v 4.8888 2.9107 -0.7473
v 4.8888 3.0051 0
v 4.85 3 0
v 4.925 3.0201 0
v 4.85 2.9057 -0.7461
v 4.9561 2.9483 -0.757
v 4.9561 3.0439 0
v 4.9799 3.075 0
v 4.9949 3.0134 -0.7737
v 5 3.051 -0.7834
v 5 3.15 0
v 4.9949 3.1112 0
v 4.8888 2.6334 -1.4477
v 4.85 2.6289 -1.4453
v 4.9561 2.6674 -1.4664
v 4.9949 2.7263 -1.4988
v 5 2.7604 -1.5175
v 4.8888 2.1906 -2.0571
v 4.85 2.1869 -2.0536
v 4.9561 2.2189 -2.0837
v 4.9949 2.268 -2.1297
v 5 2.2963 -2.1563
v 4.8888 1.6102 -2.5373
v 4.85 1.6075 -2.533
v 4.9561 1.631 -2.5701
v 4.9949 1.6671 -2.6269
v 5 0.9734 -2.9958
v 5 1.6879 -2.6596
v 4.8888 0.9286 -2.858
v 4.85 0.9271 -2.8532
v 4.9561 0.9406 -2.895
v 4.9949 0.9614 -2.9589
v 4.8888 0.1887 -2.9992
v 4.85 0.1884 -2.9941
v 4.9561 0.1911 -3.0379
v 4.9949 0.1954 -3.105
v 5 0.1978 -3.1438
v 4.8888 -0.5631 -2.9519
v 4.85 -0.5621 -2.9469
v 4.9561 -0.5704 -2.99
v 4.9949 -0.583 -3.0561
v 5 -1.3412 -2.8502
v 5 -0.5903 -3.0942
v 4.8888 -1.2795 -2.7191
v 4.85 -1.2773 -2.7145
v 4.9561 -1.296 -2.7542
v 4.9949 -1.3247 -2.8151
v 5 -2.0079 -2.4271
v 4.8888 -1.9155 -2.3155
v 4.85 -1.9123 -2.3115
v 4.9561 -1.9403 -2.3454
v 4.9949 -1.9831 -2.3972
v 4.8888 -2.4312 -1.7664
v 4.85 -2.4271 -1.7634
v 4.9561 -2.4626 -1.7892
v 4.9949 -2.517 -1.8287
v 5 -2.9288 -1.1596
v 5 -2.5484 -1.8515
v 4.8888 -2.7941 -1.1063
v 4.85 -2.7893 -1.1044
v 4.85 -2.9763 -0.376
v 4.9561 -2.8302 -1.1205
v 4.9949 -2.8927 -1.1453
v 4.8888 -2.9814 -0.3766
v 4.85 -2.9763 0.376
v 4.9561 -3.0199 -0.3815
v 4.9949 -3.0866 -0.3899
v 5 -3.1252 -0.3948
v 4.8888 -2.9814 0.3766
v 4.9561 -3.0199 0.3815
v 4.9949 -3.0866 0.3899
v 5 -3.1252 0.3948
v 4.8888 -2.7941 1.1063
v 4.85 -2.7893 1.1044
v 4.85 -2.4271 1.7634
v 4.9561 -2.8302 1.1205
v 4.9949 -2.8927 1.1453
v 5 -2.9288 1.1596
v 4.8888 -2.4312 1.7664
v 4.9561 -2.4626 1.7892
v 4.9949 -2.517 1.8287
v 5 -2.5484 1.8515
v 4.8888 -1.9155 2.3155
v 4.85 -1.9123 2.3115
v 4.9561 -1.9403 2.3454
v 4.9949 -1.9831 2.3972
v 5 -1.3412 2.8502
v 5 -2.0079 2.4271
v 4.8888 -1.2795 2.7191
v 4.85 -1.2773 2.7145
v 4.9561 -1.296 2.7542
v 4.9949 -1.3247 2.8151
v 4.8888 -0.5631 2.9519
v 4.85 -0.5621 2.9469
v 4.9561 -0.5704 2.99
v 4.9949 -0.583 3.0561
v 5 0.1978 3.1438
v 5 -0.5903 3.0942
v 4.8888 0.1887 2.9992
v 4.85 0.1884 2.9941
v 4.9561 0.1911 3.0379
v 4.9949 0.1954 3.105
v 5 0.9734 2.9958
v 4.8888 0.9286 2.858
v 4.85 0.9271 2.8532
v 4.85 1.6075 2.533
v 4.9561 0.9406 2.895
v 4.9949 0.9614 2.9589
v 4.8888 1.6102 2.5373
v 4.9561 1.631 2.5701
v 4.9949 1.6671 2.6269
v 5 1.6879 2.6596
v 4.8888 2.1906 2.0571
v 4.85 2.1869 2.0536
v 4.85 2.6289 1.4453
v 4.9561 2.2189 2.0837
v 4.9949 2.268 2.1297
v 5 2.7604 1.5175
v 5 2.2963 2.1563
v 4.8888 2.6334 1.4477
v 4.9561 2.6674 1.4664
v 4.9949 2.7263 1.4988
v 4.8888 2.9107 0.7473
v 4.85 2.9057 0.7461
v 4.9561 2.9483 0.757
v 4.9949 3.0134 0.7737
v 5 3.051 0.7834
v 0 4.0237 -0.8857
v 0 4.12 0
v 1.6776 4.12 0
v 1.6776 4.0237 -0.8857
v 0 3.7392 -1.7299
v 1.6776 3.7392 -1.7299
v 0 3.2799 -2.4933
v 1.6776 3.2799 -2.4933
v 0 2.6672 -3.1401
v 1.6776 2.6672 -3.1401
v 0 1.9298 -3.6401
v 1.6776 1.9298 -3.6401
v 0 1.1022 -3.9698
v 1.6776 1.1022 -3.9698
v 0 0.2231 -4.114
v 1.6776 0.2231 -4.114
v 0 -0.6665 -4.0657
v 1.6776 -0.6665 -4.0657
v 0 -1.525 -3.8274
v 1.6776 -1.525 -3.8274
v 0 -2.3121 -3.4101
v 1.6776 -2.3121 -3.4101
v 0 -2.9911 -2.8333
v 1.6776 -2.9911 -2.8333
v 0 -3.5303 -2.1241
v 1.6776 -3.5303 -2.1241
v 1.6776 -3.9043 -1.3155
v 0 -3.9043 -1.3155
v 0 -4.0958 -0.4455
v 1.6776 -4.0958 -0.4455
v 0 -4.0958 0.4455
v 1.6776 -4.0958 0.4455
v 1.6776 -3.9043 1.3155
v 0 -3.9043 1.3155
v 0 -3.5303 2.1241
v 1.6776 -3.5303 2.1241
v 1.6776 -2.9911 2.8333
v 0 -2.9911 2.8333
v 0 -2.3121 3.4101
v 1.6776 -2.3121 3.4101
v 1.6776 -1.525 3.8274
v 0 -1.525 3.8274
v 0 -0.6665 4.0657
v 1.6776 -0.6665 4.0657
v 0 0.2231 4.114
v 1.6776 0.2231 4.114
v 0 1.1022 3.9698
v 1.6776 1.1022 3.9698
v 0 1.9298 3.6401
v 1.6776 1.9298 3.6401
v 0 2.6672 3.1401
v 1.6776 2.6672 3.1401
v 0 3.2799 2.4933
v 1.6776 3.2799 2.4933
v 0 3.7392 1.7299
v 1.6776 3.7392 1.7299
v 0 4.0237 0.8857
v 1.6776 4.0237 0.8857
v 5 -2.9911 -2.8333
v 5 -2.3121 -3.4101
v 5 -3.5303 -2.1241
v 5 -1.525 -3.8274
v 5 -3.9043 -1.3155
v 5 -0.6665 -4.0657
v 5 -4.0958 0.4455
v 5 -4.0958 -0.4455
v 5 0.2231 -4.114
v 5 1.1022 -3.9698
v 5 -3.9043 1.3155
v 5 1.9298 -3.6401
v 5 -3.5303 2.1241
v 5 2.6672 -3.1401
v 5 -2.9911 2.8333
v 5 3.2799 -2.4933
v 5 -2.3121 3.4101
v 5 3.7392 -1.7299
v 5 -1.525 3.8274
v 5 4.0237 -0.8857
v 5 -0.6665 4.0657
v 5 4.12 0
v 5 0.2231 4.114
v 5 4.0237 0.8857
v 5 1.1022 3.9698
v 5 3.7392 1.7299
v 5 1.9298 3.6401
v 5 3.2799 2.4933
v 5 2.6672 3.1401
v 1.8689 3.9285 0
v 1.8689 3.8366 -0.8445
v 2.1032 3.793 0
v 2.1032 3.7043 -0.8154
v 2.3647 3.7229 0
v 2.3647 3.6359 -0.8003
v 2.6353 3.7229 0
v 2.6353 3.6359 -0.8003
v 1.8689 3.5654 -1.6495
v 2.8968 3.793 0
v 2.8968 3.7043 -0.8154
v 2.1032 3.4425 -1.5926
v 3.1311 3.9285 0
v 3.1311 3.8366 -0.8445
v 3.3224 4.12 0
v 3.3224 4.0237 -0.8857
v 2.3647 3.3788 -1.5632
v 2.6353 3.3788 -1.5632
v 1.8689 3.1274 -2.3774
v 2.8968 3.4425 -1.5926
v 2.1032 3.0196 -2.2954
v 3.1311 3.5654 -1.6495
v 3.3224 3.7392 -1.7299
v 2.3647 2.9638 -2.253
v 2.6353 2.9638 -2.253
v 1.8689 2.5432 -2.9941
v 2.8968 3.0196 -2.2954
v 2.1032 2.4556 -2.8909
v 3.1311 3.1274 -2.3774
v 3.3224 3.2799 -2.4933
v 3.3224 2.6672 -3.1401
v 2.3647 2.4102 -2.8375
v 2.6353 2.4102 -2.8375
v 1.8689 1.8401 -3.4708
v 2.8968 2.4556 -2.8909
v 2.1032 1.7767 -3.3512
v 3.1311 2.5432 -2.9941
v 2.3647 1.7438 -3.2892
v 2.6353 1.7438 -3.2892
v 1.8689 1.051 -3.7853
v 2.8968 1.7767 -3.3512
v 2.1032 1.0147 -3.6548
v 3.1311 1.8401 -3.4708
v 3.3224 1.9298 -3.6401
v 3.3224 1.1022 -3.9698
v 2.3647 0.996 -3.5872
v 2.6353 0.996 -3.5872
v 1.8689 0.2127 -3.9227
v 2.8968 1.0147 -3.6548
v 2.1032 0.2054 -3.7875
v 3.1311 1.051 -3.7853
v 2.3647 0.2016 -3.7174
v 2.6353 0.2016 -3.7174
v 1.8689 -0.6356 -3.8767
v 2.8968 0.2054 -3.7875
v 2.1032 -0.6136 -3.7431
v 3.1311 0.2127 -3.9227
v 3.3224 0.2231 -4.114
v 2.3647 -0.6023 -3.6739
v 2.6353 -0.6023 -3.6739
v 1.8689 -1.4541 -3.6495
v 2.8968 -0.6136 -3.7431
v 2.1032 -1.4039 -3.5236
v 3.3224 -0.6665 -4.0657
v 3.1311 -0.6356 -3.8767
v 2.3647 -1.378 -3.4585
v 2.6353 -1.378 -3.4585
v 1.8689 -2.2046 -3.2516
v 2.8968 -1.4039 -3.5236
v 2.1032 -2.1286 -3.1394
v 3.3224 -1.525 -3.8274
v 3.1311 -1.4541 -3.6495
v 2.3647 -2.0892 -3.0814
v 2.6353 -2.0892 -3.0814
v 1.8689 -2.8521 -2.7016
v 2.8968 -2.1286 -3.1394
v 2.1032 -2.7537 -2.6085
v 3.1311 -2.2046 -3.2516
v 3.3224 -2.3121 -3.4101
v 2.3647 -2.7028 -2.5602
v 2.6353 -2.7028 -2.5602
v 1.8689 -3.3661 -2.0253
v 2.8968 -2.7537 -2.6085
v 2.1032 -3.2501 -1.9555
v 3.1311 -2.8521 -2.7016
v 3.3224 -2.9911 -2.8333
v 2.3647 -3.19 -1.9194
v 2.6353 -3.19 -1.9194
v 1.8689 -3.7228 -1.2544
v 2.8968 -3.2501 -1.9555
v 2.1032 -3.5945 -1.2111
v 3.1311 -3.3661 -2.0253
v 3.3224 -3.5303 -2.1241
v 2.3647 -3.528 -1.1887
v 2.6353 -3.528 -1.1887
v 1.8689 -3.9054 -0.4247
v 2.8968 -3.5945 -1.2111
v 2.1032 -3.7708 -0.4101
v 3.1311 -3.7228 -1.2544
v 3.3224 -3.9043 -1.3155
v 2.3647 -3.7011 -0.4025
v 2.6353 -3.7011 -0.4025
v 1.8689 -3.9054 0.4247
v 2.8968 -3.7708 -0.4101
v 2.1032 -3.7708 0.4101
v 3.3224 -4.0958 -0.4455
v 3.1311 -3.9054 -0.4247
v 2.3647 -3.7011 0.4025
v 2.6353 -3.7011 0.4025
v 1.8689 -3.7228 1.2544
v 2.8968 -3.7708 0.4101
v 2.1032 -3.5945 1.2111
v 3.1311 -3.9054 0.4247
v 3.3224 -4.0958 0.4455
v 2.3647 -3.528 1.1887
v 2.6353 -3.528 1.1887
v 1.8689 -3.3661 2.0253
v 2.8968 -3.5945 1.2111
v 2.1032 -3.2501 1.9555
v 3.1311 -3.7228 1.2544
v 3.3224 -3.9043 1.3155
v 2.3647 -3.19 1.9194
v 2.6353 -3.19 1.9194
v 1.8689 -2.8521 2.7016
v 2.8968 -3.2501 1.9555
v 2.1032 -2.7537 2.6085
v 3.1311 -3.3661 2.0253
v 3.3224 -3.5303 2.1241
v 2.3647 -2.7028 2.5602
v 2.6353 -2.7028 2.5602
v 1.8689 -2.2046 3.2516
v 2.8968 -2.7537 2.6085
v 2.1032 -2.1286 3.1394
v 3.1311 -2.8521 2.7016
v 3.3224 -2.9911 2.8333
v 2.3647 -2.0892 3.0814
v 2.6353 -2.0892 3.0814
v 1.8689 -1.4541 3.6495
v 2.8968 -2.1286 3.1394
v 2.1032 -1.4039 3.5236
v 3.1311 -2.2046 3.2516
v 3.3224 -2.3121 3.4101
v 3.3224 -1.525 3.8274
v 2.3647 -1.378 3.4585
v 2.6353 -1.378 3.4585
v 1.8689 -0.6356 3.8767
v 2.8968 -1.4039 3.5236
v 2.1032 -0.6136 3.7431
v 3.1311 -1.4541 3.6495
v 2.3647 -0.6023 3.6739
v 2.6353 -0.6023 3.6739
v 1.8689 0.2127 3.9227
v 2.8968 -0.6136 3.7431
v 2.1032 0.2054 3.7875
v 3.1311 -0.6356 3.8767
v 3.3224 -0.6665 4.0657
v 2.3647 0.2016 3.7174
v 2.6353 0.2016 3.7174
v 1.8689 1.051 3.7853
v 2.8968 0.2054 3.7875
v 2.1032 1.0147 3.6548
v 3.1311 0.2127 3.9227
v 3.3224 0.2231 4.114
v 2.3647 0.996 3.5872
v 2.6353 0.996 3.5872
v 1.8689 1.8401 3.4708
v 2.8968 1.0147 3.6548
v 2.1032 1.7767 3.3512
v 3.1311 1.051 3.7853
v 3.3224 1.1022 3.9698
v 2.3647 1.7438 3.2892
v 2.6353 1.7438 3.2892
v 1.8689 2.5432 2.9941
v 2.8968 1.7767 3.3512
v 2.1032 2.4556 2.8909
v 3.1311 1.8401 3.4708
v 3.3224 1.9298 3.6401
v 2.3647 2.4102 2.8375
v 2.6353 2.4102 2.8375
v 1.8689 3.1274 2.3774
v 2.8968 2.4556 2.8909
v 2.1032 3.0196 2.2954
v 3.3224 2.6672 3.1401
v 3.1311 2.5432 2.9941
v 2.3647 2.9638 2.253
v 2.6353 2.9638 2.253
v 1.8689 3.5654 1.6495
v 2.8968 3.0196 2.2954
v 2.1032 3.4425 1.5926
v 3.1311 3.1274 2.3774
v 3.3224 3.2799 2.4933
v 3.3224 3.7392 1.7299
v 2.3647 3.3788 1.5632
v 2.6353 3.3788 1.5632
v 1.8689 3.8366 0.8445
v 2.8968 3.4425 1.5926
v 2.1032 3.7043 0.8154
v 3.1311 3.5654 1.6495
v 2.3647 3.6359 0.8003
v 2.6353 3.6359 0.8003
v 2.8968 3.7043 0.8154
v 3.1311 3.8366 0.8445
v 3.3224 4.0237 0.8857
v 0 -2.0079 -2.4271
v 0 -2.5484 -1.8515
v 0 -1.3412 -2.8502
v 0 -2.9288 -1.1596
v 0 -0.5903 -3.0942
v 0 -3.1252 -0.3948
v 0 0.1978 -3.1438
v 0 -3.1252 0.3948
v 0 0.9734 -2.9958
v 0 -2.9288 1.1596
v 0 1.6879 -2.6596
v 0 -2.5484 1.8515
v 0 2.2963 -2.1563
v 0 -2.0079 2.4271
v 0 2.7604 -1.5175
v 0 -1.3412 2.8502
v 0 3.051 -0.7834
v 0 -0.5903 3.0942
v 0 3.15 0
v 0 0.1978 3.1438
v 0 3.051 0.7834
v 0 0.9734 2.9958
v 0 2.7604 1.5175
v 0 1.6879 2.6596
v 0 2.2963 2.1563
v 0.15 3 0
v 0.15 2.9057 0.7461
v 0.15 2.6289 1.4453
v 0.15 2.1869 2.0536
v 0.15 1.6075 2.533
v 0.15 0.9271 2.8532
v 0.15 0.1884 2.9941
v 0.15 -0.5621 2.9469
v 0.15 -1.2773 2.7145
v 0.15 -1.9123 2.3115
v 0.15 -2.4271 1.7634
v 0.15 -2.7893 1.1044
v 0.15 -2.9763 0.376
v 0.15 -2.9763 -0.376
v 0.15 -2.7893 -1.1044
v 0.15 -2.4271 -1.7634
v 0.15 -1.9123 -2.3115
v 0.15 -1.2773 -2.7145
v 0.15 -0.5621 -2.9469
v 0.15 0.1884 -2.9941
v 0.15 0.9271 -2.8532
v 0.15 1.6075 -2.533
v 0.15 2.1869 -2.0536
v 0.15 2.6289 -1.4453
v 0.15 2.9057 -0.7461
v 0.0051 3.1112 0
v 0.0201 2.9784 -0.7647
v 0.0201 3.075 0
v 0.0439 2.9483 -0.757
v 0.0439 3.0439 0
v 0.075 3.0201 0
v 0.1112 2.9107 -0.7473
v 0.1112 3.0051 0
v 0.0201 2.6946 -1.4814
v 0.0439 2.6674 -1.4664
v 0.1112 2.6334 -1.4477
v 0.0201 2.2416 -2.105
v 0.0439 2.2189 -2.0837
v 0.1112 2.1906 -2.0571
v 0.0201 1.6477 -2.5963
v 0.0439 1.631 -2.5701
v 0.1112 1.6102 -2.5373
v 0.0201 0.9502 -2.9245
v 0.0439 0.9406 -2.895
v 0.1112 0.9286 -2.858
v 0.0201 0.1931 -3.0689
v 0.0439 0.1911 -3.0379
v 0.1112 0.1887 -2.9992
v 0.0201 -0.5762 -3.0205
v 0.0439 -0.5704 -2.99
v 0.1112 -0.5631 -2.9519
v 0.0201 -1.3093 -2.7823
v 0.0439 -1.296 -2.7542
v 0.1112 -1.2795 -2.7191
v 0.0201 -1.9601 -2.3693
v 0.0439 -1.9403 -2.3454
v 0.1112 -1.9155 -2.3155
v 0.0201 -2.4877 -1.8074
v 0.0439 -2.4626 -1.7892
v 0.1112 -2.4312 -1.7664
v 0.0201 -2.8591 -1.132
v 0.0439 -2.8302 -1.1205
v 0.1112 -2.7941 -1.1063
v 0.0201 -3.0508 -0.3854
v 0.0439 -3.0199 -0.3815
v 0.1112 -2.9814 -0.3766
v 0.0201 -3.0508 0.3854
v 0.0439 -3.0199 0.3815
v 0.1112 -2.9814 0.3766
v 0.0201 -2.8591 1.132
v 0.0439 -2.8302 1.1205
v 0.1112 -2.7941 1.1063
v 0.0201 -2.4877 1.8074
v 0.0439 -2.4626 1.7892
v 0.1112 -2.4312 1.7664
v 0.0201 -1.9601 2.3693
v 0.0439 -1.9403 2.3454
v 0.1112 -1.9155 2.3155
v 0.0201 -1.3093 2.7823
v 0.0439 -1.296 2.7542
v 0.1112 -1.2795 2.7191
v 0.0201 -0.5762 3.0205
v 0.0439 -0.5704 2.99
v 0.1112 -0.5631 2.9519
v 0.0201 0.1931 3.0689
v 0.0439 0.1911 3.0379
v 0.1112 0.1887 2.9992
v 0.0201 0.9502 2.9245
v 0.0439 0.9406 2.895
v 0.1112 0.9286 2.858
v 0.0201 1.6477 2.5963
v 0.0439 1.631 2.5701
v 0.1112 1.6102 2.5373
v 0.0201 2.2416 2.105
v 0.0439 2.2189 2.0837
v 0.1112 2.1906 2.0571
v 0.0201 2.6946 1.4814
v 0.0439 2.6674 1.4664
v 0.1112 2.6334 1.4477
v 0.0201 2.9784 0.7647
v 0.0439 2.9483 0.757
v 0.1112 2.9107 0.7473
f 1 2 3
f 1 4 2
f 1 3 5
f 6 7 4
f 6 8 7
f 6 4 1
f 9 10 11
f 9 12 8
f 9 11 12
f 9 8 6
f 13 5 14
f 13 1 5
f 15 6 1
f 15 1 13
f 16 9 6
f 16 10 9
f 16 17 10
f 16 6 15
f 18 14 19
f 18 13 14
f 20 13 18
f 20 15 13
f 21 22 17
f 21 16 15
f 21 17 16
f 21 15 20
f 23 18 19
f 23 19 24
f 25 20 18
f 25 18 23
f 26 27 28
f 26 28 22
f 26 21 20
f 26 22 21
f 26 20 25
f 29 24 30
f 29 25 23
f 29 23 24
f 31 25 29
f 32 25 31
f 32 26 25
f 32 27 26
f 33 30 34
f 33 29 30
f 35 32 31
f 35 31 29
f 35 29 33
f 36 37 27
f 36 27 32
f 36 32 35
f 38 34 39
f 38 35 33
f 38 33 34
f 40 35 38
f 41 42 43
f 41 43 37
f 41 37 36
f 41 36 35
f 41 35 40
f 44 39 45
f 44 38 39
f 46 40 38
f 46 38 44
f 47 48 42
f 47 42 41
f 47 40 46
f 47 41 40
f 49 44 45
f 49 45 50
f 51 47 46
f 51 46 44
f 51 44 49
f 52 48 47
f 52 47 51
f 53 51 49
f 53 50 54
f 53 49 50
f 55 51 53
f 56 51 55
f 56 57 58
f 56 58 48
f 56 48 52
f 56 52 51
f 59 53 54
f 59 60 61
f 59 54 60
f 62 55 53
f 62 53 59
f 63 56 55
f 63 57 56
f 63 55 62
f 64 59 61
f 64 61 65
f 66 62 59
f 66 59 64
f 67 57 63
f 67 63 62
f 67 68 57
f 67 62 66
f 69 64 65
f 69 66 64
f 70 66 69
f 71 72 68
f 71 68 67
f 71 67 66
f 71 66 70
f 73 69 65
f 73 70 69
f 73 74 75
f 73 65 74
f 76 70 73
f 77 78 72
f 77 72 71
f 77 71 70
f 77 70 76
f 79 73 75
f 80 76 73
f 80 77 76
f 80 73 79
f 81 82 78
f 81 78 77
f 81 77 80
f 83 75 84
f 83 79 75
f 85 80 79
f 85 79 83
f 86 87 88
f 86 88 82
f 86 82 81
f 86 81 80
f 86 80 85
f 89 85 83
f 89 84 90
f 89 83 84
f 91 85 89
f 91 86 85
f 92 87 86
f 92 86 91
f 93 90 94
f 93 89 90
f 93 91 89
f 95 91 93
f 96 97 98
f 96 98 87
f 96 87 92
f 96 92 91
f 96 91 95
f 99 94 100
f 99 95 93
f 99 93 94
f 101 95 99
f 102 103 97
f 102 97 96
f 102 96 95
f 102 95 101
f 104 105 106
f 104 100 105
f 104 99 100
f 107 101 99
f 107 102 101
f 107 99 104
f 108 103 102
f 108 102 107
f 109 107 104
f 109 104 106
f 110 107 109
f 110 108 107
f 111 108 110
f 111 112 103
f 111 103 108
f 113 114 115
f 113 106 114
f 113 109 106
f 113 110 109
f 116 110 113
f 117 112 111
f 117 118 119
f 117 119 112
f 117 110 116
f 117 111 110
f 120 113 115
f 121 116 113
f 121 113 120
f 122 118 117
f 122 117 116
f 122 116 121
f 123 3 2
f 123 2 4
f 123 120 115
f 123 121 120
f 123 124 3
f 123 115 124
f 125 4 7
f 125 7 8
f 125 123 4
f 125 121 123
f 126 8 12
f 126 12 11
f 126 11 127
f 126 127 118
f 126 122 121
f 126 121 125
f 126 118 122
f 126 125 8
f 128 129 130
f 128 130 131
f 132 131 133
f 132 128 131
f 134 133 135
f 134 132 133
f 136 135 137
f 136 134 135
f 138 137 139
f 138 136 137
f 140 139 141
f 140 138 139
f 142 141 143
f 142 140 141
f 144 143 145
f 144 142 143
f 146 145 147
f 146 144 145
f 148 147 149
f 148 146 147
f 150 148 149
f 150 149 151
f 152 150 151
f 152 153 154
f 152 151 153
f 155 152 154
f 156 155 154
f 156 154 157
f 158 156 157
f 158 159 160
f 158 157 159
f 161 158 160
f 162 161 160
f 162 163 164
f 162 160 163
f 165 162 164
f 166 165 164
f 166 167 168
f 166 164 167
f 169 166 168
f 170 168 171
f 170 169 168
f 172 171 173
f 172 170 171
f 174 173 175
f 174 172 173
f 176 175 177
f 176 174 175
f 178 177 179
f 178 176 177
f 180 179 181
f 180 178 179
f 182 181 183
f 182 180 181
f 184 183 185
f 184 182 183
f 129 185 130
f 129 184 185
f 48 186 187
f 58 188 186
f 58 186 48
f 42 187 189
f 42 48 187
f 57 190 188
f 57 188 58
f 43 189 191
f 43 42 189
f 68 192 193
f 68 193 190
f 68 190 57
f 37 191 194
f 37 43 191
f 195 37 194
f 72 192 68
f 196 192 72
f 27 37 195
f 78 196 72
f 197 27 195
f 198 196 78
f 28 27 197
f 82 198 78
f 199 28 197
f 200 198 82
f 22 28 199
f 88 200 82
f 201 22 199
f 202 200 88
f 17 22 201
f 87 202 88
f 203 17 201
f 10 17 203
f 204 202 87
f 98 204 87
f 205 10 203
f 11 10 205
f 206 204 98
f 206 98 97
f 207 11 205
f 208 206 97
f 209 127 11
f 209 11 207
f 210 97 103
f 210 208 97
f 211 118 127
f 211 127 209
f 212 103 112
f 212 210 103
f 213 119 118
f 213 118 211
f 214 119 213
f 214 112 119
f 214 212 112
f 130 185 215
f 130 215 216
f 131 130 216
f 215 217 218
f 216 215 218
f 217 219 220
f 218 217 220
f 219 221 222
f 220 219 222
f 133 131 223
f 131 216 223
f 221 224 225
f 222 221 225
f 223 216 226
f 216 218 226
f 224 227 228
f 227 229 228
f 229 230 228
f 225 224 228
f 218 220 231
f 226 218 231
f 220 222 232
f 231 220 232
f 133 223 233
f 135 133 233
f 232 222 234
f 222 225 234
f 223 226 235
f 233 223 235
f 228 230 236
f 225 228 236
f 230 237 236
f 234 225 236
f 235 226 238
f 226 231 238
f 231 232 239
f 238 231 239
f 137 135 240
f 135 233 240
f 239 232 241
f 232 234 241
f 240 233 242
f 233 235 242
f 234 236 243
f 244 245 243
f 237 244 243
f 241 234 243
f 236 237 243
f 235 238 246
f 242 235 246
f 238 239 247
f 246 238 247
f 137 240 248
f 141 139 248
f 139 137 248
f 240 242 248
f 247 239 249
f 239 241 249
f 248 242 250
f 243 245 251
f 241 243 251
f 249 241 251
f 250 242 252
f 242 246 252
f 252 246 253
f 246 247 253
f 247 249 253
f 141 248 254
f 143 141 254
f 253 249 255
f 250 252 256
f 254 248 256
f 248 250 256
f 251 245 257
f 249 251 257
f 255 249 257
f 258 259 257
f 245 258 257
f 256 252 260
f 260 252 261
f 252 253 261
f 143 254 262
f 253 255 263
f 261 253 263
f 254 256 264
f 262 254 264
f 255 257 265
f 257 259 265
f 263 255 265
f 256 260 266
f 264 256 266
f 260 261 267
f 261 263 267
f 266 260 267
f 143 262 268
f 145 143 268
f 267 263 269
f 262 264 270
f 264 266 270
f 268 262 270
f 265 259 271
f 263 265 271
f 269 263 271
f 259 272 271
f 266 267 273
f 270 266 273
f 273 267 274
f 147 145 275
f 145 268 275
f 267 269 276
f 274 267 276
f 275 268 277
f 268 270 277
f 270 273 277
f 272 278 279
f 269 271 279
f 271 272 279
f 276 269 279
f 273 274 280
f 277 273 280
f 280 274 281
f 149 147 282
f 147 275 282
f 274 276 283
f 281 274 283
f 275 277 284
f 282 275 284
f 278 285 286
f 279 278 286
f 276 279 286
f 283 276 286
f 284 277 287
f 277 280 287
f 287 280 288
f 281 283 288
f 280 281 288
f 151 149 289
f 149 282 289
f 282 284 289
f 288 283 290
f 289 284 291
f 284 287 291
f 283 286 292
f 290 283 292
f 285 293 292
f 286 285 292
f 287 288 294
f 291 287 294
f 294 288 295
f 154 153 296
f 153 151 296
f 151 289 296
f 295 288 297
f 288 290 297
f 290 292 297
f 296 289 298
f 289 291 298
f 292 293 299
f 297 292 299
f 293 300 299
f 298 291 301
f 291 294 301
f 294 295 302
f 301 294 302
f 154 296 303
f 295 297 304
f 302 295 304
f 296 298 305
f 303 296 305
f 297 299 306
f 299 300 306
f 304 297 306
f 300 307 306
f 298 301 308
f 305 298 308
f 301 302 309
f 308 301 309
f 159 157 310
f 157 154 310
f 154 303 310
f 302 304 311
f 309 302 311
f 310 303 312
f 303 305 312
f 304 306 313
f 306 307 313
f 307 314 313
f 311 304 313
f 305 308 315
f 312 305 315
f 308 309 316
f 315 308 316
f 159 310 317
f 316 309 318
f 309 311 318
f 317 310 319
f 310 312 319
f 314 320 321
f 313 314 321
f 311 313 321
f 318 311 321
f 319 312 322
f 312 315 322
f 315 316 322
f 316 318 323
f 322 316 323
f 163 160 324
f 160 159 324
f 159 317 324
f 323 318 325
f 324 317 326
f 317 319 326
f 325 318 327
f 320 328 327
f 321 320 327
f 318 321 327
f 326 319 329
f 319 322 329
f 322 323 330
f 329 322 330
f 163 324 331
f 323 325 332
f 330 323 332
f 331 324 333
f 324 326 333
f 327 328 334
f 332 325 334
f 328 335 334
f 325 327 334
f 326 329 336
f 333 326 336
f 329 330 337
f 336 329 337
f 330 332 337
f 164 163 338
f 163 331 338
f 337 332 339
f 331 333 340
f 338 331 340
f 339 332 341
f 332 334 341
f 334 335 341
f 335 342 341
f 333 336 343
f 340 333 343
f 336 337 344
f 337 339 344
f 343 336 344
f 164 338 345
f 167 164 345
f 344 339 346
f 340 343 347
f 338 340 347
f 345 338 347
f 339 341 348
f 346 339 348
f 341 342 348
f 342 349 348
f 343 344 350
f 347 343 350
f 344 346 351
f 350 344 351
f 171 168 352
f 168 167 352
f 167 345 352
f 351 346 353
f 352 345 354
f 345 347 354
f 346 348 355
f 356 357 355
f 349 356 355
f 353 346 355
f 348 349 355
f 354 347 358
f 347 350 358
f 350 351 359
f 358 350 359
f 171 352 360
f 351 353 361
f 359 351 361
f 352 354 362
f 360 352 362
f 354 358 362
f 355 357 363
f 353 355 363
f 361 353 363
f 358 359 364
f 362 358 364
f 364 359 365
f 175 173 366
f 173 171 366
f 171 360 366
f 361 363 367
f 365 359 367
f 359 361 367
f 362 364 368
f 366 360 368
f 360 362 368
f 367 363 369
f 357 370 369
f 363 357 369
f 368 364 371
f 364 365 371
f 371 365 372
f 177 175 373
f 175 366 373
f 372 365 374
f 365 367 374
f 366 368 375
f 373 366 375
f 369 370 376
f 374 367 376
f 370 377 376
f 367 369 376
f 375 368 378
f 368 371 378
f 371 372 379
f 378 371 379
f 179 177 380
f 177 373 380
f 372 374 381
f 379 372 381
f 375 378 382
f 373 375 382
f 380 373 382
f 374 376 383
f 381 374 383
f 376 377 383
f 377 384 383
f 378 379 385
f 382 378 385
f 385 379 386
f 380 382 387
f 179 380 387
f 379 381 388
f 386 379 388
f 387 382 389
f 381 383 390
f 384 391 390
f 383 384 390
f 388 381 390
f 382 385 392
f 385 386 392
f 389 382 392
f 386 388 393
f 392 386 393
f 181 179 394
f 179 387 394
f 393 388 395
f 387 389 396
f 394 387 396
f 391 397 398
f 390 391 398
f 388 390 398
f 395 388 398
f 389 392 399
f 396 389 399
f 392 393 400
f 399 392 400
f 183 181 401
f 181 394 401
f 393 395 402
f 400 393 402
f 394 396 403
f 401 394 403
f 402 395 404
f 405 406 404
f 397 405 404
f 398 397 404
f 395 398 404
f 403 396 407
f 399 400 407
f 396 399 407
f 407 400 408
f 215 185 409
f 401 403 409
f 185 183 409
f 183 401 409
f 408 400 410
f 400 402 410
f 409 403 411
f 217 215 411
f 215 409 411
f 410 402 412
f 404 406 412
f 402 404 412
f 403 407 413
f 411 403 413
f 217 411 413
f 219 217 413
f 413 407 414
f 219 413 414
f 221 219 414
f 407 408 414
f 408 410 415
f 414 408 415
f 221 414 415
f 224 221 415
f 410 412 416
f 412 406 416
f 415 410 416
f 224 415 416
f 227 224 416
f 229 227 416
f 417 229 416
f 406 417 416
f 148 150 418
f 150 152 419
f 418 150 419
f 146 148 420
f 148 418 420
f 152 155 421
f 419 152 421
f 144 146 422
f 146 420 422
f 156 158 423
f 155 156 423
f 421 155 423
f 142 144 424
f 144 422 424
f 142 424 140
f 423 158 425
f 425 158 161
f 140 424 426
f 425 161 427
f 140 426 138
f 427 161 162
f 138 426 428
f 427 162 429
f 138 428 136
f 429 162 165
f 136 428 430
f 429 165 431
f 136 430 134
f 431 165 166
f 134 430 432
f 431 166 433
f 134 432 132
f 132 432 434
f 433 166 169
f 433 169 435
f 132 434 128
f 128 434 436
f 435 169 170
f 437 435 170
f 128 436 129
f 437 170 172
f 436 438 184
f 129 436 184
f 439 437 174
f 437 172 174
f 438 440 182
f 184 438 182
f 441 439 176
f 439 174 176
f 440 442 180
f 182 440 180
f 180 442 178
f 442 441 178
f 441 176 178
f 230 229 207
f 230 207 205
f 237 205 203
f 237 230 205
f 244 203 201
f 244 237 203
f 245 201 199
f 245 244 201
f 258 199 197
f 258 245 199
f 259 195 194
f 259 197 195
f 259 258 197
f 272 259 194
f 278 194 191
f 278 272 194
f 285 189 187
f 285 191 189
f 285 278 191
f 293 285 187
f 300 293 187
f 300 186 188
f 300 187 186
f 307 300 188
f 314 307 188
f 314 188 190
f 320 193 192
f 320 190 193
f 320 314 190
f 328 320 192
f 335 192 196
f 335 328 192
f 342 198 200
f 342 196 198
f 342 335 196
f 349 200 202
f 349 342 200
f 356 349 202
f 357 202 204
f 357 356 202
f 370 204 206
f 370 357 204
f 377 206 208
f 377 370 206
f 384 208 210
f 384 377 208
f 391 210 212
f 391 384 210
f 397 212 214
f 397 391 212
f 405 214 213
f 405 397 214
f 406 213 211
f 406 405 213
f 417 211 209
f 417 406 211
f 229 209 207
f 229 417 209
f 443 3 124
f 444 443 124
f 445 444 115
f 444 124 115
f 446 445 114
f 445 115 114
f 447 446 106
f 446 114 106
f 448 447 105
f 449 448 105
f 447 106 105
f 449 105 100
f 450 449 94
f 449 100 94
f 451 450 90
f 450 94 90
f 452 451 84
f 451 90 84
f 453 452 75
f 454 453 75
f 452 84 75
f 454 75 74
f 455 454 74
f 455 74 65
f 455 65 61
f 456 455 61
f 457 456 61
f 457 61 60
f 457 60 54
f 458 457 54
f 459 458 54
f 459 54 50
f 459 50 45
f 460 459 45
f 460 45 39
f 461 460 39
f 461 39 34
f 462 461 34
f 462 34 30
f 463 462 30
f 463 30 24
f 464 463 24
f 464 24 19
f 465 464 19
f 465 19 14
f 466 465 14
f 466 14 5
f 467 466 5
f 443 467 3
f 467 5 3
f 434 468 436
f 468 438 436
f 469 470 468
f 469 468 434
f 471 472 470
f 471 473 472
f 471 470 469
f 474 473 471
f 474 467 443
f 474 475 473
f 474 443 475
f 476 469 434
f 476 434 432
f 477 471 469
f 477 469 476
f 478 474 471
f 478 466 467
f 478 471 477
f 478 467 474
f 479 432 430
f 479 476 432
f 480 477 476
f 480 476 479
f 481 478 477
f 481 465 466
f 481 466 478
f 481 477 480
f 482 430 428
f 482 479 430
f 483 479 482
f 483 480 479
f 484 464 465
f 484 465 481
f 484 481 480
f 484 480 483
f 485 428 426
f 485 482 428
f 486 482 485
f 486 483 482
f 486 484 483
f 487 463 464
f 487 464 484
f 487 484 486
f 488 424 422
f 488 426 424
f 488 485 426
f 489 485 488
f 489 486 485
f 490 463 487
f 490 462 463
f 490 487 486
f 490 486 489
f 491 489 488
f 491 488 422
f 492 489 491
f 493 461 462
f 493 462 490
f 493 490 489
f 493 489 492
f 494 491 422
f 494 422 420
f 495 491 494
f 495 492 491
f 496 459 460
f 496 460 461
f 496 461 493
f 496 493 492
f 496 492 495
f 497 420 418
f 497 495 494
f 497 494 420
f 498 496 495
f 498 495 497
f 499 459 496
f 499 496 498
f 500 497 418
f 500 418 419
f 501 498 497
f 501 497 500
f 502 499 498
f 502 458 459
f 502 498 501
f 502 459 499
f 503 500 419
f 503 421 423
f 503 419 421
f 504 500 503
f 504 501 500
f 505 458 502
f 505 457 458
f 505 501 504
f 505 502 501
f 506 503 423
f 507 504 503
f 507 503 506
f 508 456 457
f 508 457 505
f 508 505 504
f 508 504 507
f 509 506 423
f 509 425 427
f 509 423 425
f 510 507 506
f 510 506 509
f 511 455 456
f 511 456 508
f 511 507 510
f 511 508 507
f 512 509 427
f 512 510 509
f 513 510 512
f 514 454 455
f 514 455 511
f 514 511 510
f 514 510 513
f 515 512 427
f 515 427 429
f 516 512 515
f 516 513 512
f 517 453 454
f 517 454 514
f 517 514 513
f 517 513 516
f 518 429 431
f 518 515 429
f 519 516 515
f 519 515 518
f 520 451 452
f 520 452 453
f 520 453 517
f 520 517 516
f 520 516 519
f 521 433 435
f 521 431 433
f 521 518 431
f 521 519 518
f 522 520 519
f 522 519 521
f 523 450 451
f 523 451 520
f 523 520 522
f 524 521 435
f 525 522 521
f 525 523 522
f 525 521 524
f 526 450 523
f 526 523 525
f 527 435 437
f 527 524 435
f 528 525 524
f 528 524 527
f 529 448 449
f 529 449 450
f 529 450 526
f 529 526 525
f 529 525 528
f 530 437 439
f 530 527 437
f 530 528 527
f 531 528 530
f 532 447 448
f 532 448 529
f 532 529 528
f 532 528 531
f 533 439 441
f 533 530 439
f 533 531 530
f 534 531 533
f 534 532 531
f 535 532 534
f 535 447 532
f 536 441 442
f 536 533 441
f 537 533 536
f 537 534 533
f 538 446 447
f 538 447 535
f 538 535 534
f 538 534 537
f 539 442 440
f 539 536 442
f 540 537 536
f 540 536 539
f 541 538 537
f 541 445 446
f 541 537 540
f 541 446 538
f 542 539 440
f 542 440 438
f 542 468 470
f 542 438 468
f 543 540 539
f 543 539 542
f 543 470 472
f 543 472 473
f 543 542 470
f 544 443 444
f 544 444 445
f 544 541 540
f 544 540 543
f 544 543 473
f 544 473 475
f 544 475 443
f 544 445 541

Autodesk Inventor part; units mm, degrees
sketch "Sketch_2" plane through (0, 0, 0) normal (0, 0, 1) x (1, 0, 0)
  line L0 (5, 0) -> (0, 0)
  arc A0 (0, 3.15) -> (0.15, 3) centre (0.15, 3.15) ccw
  line L1 (0.15, 3) -> (4.85, 3)
  arc A1 (4.85, 3) -> (5, 3.15) centre (4.85, 3.15) ccw
  line L2 (5, 3.15) -> (5, 4.12)
  line L3 (5, 4.12) -> (3.3224, 4.12)
  arc A2 (1.6776, 4.12) -> (3.3224, 4.12) centre (2.5, 4.75) ccw
  line L4 (1.6776, 4.12) -> (0, 4.12)
  line L5 (0, 4.12) -> (0, 3.15)
revolve "Revolution1" add sketch "Sketch_2" angle 360 about axis through (5, 0, 0) along (1, 0, 0)
ref_plane "mss_ir_XY" through (0, 0, 0) normal (1, 0, 0) x (0, 0, -1)
ref_plane "mss_ir_YZ" through (0, 0, 0) normal (0, 0, -1) x (0, 1, 0)
ref_plane "mss_ir_ZX" through (0, 0, 0) normal (0, 1, 0) x (1, 0, 0)
properties part number "W686ZZ Inner ring"
